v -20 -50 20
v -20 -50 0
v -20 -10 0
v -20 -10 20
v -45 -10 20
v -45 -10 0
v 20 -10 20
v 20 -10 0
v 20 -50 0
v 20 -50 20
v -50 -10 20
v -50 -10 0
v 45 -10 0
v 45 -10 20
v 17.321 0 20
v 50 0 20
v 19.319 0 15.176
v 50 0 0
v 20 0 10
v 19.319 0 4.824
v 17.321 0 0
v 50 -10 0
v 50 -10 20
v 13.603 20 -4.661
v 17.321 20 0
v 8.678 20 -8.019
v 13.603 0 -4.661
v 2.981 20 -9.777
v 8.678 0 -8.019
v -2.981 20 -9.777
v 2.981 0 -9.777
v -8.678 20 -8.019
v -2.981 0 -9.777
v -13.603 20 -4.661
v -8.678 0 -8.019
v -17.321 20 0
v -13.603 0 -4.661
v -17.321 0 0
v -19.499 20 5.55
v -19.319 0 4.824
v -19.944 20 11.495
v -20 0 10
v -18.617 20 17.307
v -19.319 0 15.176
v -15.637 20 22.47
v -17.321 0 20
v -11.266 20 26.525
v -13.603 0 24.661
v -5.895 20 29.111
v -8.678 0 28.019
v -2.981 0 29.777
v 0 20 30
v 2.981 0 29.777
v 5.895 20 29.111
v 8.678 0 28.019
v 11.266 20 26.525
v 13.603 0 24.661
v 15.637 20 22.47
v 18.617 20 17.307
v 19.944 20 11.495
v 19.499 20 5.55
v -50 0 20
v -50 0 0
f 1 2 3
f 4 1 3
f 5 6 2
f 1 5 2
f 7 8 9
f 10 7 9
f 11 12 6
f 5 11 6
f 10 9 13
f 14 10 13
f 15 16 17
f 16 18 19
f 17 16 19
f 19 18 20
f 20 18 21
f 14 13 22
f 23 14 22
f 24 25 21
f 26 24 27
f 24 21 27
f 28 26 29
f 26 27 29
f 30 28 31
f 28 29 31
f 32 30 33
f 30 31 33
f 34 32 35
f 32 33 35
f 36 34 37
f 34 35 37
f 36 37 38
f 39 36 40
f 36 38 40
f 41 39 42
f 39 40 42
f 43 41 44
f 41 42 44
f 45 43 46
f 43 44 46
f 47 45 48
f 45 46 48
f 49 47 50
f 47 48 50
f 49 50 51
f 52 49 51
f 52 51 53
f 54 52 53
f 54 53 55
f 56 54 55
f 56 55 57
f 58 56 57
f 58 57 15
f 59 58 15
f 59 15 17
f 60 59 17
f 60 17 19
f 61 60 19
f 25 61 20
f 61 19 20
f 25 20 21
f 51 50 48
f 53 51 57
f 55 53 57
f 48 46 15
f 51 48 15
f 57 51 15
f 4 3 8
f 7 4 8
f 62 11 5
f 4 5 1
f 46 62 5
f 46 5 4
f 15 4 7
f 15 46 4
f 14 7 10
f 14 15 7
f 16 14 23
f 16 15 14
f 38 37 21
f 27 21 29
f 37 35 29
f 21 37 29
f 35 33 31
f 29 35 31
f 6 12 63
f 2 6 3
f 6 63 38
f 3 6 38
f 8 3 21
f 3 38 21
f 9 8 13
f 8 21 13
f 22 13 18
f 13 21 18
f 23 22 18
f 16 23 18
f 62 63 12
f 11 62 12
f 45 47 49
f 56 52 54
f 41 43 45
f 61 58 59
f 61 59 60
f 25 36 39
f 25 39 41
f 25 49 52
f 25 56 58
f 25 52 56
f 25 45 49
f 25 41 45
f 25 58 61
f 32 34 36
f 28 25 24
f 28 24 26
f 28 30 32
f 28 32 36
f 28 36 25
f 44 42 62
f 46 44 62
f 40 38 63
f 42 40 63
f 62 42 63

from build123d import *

# Parameters (mm, degrees)
EXTRUDE_1_DEPTH = 20
SKETCH_3_R      = 20
EXTRUDE_2_DEPTH = 20


with BuildPart() as part:
    # 草图2 → 凸台-拉伸1 (new body)
    with BuildSketch(Plane.XY):
        Polygon((50, 0), (-50, 0), (-50, -10), (-45, -10), (-20, -50), (-20, -10), (20, -10), (20, -50), (45, -10), (50, -10), align=None)
    extrude(amount=EXTRUDE_1_DEPTH)

    # 草图3 → 凸台-拉伸2 (add)
    with BuildSketch(Plane(origin=(0, 0, 0), x_dir=(1, 0, 0), z_dir=(0, 1, 0))):
        with Locations(Location((0, -10, 0), (0, 0, 30))):
            Circle(SKETCH_3_R)
    extrude(amount=EXTRUDE_2_DEPTH)


solid = part.part
